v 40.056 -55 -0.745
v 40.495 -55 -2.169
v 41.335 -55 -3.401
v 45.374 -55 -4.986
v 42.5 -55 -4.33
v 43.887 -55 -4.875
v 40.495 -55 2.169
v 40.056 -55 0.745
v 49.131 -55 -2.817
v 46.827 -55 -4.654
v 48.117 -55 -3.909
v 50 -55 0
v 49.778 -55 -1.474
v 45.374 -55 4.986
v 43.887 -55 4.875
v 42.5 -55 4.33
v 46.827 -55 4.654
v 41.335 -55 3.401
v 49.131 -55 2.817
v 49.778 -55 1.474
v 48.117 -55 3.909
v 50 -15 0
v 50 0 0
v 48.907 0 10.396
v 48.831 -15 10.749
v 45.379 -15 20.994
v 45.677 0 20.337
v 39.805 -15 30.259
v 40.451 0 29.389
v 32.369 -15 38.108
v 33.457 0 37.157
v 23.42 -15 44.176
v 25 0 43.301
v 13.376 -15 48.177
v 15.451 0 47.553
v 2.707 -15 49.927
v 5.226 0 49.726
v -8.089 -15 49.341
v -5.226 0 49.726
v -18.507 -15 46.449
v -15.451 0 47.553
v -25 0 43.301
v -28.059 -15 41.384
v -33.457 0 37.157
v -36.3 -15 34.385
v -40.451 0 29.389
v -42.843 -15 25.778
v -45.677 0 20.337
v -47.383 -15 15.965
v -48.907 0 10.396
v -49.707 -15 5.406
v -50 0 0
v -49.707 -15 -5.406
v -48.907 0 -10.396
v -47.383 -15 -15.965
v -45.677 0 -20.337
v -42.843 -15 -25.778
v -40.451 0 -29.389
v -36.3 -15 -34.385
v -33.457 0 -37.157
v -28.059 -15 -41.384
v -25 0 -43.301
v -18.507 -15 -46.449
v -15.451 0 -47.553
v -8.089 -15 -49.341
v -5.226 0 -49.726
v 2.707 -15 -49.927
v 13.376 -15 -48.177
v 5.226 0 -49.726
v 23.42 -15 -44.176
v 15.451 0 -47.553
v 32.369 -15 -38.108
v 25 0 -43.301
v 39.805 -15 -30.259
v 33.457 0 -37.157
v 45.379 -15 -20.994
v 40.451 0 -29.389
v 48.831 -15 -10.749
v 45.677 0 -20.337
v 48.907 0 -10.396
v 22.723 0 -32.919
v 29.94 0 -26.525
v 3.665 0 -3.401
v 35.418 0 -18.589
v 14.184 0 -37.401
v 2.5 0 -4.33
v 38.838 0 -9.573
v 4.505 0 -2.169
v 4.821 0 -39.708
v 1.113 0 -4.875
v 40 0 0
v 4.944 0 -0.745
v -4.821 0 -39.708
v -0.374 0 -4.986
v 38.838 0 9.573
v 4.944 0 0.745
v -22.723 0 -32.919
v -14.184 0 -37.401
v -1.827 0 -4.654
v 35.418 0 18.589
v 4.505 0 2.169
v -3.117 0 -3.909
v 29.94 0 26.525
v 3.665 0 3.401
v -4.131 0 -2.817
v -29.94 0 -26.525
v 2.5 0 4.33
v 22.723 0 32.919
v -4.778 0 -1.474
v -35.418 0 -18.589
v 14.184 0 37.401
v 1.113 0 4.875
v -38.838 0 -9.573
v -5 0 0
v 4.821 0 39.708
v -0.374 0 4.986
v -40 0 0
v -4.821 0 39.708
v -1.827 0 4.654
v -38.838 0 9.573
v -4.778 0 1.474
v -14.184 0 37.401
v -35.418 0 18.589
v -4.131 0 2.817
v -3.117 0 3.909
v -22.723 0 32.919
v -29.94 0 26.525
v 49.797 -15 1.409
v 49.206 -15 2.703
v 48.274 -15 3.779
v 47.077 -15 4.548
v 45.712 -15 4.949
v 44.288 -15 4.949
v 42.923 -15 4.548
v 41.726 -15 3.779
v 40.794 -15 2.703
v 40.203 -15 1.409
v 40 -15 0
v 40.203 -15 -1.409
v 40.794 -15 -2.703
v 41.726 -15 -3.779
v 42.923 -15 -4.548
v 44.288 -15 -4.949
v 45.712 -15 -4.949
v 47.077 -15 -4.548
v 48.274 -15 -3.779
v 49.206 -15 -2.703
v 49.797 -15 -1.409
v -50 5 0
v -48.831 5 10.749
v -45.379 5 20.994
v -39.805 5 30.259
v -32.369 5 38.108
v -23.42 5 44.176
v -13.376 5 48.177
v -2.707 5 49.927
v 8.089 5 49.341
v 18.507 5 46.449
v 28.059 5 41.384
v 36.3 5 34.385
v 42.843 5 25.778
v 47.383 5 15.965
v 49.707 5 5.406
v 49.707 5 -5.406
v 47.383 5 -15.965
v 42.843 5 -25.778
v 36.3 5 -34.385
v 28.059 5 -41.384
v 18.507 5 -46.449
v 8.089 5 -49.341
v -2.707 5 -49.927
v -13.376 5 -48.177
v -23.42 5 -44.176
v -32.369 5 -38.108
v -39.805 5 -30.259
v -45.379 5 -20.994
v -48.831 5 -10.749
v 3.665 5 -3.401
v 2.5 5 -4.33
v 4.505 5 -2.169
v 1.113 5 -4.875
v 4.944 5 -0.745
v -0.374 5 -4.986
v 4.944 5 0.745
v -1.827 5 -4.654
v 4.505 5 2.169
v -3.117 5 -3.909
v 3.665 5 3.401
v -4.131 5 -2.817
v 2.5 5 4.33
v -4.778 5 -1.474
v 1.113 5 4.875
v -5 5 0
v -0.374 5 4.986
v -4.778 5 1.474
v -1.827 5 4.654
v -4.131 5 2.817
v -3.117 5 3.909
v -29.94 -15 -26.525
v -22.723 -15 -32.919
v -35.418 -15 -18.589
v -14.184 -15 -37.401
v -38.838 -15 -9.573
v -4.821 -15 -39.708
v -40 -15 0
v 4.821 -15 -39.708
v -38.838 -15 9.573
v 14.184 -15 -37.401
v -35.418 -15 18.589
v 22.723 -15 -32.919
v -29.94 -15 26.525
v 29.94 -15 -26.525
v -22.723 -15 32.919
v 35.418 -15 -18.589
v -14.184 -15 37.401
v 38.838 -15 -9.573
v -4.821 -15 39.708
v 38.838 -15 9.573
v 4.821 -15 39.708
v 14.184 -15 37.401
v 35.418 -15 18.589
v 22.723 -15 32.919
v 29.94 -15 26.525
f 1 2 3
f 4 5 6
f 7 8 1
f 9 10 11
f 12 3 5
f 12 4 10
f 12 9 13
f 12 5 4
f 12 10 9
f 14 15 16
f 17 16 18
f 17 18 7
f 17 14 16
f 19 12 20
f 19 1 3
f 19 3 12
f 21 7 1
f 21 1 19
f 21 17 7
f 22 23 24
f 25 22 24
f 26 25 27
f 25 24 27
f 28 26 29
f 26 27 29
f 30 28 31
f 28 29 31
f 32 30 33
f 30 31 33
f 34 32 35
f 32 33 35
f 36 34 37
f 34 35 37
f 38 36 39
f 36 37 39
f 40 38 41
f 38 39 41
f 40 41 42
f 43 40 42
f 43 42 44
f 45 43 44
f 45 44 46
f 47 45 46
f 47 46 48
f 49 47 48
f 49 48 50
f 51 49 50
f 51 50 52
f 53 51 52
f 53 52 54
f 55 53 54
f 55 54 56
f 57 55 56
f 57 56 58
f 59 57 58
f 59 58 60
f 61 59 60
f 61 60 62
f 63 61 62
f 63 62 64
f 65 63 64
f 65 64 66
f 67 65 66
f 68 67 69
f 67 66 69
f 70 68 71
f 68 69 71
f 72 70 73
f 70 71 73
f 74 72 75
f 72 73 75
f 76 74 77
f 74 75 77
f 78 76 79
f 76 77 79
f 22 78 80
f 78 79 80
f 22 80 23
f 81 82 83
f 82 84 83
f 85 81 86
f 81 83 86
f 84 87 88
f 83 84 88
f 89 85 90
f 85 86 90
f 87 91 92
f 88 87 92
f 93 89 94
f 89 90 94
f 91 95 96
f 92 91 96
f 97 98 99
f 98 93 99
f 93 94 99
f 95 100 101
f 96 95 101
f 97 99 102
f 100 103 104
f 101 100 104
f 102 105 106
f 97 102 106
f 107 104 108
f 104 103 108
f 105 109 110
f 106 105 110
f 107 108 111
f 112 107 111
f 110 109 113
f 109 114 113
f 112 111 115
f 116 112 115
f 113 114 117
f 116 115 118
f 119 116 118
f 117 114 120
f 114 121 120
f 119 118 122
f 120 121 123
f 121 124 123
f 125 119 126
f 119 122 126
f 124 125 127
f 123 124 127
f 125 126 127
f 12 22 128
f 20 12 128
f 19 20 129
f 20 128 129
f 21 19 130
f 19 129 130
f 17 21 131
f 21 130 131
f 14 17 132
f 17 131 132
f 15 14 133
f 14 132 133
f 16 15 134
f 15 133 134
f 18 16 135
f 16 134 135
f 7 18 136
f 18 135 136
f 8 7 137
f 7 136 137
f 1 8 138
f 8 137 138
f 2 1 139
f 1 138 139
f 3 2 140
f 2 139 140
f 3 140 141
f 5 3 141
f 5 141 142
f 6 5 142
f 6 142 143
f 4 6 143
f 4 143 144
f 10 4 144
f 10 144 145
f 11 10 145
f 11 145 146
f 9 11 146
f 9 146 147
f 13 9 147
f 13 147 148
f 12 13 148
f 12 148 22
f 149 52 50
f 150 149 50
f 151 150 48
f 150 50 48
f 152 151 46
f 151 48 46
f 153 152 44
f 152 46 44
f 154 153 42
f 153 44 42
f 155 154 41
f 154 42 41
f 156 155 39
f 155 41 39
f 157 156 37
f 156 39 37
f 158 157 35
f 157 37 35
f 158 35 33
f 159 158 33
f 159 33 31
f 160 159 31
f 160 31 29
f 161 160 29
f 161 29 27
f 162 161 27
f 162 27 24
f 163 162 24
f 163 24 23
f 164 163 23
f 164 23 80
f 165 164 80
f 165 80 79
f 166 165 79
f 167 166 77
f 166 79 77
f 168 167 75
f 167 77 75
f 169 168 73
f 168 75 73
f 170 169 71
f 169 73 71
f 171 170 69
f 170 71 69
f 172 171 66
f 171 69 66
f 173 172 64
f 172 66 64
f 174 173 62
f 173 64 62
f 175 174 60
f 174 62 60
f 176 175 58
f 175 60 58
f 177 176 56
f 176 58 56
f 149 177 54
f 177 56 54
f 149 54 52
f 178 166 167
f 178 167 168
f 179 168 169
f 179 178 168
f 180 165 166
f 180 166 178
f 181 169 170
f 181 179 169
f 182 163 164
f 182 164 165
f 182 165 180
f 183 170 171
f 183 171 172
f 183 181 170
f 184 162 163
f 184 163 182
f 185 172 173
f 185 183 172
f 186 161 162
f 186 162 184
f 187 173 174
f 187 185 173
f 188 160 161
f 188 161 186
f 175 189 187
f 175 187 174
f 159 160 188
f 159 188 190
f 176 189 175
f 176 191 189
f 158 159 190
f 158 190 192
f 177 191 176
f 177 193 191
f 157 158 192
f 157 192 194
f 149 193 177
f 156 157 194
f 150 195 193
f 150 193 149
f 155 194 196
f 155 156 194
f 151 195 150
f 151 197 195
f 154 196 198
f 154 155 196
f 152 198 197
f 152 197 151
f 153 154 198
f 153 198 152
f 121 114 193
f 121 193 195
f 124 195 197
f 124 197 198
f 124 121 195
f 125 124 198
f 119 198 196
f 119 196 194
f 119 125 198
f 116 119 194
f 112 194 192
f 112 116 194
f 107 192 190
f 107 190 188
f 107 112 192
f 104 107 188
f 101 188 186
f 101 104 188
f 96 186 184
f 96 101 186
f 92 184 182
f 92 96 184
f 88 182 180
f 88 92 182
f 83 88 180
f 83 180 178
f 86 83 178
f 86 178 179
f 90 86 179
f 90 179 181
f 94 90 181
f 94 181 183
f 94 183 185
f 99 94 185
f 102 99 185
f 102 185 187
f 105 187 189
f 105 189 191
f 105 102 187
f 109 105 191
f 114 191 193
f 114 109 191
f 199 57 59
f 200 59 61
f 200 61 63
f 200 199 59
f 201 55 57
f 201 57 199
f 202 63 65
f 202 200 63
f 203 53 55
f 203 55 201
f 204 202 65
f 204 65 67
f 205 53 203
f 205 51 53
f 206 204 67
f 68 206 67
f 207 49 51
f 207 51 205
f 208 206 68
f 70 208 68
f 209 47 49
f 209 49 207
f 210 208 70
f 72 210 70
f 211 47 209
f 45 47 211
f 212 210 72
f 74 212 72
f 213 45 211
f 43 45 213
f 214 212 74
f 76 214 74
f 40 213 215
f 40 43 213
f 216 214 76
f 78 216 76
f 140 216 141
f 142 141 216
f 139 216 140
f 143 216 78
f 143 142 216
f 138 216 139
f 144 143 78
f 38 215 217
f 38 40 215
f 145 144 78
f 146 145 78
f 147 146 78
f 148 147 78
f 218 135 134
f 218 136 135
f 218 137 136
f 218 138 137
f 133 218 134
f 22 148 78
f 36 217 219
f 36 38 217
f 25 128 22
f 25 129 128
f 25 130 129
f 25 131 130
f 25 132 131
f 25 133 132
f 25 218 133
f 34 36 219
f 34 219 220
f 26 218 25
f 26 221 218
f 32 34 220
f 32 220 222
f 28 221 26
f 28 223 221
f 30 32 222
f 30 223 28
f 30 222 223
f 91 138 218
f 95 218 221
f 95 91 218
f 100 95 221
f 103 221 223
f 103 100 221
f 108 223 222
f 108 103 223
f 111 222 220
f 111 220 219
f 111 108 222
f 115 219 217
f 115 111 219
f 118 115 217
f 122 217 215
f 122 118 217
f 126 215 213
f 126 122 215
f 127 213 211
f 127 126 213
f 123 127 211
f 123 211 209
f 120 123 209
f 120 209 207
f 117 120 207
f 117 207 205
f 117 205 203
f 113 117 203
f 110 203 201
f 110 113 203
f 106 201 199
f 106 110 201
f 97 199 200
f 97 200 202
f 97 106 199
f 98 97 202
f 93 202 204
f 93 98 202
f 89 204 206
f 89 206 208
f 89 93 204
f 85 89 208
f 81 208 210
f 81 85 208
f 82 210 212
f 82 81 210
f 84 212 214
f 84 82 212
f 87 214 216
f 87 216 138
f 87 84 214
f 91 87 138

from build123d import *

# Parameters (mm, degrees)
F0_R     = 50
F0_R_2   = 40
F1_DEPTH = 15
F2_R     = 50
F2_R_2   = 5
F3_DEPTH = 5
F4_R     = 5
F5_DEPTH = 40


with BuildPart() as f1:
    # F0 (on Front) → F1 (new body)
    with BuildSketch(Plane.XZ):
        Circle(F0_R)
        Circle(F0_R_2, mode=Mode.SUBTRACT)
    extrude(amount=F1_DEPTH)

    # F2 (on face) → F3 (join)
    with BuildSketch(Plane(origin=(0, 0, 0), x_dir=(-1, 0, 0), z_dir=(0, 1, 0))):
        Circle(F2_R)
        Circle(F2_R_2, mode=Mode.SUBTRACT)
    extrude(amount=F3_DEPTH)

    # F4 (on face) → F5 (join)
    with BuildSketch(Plane.XZ.offset(15)):
        with Locations((45, 0)):
            Circle(F4_R)
    extrude(amount=F5_DEPTH)


solid = f1.part
